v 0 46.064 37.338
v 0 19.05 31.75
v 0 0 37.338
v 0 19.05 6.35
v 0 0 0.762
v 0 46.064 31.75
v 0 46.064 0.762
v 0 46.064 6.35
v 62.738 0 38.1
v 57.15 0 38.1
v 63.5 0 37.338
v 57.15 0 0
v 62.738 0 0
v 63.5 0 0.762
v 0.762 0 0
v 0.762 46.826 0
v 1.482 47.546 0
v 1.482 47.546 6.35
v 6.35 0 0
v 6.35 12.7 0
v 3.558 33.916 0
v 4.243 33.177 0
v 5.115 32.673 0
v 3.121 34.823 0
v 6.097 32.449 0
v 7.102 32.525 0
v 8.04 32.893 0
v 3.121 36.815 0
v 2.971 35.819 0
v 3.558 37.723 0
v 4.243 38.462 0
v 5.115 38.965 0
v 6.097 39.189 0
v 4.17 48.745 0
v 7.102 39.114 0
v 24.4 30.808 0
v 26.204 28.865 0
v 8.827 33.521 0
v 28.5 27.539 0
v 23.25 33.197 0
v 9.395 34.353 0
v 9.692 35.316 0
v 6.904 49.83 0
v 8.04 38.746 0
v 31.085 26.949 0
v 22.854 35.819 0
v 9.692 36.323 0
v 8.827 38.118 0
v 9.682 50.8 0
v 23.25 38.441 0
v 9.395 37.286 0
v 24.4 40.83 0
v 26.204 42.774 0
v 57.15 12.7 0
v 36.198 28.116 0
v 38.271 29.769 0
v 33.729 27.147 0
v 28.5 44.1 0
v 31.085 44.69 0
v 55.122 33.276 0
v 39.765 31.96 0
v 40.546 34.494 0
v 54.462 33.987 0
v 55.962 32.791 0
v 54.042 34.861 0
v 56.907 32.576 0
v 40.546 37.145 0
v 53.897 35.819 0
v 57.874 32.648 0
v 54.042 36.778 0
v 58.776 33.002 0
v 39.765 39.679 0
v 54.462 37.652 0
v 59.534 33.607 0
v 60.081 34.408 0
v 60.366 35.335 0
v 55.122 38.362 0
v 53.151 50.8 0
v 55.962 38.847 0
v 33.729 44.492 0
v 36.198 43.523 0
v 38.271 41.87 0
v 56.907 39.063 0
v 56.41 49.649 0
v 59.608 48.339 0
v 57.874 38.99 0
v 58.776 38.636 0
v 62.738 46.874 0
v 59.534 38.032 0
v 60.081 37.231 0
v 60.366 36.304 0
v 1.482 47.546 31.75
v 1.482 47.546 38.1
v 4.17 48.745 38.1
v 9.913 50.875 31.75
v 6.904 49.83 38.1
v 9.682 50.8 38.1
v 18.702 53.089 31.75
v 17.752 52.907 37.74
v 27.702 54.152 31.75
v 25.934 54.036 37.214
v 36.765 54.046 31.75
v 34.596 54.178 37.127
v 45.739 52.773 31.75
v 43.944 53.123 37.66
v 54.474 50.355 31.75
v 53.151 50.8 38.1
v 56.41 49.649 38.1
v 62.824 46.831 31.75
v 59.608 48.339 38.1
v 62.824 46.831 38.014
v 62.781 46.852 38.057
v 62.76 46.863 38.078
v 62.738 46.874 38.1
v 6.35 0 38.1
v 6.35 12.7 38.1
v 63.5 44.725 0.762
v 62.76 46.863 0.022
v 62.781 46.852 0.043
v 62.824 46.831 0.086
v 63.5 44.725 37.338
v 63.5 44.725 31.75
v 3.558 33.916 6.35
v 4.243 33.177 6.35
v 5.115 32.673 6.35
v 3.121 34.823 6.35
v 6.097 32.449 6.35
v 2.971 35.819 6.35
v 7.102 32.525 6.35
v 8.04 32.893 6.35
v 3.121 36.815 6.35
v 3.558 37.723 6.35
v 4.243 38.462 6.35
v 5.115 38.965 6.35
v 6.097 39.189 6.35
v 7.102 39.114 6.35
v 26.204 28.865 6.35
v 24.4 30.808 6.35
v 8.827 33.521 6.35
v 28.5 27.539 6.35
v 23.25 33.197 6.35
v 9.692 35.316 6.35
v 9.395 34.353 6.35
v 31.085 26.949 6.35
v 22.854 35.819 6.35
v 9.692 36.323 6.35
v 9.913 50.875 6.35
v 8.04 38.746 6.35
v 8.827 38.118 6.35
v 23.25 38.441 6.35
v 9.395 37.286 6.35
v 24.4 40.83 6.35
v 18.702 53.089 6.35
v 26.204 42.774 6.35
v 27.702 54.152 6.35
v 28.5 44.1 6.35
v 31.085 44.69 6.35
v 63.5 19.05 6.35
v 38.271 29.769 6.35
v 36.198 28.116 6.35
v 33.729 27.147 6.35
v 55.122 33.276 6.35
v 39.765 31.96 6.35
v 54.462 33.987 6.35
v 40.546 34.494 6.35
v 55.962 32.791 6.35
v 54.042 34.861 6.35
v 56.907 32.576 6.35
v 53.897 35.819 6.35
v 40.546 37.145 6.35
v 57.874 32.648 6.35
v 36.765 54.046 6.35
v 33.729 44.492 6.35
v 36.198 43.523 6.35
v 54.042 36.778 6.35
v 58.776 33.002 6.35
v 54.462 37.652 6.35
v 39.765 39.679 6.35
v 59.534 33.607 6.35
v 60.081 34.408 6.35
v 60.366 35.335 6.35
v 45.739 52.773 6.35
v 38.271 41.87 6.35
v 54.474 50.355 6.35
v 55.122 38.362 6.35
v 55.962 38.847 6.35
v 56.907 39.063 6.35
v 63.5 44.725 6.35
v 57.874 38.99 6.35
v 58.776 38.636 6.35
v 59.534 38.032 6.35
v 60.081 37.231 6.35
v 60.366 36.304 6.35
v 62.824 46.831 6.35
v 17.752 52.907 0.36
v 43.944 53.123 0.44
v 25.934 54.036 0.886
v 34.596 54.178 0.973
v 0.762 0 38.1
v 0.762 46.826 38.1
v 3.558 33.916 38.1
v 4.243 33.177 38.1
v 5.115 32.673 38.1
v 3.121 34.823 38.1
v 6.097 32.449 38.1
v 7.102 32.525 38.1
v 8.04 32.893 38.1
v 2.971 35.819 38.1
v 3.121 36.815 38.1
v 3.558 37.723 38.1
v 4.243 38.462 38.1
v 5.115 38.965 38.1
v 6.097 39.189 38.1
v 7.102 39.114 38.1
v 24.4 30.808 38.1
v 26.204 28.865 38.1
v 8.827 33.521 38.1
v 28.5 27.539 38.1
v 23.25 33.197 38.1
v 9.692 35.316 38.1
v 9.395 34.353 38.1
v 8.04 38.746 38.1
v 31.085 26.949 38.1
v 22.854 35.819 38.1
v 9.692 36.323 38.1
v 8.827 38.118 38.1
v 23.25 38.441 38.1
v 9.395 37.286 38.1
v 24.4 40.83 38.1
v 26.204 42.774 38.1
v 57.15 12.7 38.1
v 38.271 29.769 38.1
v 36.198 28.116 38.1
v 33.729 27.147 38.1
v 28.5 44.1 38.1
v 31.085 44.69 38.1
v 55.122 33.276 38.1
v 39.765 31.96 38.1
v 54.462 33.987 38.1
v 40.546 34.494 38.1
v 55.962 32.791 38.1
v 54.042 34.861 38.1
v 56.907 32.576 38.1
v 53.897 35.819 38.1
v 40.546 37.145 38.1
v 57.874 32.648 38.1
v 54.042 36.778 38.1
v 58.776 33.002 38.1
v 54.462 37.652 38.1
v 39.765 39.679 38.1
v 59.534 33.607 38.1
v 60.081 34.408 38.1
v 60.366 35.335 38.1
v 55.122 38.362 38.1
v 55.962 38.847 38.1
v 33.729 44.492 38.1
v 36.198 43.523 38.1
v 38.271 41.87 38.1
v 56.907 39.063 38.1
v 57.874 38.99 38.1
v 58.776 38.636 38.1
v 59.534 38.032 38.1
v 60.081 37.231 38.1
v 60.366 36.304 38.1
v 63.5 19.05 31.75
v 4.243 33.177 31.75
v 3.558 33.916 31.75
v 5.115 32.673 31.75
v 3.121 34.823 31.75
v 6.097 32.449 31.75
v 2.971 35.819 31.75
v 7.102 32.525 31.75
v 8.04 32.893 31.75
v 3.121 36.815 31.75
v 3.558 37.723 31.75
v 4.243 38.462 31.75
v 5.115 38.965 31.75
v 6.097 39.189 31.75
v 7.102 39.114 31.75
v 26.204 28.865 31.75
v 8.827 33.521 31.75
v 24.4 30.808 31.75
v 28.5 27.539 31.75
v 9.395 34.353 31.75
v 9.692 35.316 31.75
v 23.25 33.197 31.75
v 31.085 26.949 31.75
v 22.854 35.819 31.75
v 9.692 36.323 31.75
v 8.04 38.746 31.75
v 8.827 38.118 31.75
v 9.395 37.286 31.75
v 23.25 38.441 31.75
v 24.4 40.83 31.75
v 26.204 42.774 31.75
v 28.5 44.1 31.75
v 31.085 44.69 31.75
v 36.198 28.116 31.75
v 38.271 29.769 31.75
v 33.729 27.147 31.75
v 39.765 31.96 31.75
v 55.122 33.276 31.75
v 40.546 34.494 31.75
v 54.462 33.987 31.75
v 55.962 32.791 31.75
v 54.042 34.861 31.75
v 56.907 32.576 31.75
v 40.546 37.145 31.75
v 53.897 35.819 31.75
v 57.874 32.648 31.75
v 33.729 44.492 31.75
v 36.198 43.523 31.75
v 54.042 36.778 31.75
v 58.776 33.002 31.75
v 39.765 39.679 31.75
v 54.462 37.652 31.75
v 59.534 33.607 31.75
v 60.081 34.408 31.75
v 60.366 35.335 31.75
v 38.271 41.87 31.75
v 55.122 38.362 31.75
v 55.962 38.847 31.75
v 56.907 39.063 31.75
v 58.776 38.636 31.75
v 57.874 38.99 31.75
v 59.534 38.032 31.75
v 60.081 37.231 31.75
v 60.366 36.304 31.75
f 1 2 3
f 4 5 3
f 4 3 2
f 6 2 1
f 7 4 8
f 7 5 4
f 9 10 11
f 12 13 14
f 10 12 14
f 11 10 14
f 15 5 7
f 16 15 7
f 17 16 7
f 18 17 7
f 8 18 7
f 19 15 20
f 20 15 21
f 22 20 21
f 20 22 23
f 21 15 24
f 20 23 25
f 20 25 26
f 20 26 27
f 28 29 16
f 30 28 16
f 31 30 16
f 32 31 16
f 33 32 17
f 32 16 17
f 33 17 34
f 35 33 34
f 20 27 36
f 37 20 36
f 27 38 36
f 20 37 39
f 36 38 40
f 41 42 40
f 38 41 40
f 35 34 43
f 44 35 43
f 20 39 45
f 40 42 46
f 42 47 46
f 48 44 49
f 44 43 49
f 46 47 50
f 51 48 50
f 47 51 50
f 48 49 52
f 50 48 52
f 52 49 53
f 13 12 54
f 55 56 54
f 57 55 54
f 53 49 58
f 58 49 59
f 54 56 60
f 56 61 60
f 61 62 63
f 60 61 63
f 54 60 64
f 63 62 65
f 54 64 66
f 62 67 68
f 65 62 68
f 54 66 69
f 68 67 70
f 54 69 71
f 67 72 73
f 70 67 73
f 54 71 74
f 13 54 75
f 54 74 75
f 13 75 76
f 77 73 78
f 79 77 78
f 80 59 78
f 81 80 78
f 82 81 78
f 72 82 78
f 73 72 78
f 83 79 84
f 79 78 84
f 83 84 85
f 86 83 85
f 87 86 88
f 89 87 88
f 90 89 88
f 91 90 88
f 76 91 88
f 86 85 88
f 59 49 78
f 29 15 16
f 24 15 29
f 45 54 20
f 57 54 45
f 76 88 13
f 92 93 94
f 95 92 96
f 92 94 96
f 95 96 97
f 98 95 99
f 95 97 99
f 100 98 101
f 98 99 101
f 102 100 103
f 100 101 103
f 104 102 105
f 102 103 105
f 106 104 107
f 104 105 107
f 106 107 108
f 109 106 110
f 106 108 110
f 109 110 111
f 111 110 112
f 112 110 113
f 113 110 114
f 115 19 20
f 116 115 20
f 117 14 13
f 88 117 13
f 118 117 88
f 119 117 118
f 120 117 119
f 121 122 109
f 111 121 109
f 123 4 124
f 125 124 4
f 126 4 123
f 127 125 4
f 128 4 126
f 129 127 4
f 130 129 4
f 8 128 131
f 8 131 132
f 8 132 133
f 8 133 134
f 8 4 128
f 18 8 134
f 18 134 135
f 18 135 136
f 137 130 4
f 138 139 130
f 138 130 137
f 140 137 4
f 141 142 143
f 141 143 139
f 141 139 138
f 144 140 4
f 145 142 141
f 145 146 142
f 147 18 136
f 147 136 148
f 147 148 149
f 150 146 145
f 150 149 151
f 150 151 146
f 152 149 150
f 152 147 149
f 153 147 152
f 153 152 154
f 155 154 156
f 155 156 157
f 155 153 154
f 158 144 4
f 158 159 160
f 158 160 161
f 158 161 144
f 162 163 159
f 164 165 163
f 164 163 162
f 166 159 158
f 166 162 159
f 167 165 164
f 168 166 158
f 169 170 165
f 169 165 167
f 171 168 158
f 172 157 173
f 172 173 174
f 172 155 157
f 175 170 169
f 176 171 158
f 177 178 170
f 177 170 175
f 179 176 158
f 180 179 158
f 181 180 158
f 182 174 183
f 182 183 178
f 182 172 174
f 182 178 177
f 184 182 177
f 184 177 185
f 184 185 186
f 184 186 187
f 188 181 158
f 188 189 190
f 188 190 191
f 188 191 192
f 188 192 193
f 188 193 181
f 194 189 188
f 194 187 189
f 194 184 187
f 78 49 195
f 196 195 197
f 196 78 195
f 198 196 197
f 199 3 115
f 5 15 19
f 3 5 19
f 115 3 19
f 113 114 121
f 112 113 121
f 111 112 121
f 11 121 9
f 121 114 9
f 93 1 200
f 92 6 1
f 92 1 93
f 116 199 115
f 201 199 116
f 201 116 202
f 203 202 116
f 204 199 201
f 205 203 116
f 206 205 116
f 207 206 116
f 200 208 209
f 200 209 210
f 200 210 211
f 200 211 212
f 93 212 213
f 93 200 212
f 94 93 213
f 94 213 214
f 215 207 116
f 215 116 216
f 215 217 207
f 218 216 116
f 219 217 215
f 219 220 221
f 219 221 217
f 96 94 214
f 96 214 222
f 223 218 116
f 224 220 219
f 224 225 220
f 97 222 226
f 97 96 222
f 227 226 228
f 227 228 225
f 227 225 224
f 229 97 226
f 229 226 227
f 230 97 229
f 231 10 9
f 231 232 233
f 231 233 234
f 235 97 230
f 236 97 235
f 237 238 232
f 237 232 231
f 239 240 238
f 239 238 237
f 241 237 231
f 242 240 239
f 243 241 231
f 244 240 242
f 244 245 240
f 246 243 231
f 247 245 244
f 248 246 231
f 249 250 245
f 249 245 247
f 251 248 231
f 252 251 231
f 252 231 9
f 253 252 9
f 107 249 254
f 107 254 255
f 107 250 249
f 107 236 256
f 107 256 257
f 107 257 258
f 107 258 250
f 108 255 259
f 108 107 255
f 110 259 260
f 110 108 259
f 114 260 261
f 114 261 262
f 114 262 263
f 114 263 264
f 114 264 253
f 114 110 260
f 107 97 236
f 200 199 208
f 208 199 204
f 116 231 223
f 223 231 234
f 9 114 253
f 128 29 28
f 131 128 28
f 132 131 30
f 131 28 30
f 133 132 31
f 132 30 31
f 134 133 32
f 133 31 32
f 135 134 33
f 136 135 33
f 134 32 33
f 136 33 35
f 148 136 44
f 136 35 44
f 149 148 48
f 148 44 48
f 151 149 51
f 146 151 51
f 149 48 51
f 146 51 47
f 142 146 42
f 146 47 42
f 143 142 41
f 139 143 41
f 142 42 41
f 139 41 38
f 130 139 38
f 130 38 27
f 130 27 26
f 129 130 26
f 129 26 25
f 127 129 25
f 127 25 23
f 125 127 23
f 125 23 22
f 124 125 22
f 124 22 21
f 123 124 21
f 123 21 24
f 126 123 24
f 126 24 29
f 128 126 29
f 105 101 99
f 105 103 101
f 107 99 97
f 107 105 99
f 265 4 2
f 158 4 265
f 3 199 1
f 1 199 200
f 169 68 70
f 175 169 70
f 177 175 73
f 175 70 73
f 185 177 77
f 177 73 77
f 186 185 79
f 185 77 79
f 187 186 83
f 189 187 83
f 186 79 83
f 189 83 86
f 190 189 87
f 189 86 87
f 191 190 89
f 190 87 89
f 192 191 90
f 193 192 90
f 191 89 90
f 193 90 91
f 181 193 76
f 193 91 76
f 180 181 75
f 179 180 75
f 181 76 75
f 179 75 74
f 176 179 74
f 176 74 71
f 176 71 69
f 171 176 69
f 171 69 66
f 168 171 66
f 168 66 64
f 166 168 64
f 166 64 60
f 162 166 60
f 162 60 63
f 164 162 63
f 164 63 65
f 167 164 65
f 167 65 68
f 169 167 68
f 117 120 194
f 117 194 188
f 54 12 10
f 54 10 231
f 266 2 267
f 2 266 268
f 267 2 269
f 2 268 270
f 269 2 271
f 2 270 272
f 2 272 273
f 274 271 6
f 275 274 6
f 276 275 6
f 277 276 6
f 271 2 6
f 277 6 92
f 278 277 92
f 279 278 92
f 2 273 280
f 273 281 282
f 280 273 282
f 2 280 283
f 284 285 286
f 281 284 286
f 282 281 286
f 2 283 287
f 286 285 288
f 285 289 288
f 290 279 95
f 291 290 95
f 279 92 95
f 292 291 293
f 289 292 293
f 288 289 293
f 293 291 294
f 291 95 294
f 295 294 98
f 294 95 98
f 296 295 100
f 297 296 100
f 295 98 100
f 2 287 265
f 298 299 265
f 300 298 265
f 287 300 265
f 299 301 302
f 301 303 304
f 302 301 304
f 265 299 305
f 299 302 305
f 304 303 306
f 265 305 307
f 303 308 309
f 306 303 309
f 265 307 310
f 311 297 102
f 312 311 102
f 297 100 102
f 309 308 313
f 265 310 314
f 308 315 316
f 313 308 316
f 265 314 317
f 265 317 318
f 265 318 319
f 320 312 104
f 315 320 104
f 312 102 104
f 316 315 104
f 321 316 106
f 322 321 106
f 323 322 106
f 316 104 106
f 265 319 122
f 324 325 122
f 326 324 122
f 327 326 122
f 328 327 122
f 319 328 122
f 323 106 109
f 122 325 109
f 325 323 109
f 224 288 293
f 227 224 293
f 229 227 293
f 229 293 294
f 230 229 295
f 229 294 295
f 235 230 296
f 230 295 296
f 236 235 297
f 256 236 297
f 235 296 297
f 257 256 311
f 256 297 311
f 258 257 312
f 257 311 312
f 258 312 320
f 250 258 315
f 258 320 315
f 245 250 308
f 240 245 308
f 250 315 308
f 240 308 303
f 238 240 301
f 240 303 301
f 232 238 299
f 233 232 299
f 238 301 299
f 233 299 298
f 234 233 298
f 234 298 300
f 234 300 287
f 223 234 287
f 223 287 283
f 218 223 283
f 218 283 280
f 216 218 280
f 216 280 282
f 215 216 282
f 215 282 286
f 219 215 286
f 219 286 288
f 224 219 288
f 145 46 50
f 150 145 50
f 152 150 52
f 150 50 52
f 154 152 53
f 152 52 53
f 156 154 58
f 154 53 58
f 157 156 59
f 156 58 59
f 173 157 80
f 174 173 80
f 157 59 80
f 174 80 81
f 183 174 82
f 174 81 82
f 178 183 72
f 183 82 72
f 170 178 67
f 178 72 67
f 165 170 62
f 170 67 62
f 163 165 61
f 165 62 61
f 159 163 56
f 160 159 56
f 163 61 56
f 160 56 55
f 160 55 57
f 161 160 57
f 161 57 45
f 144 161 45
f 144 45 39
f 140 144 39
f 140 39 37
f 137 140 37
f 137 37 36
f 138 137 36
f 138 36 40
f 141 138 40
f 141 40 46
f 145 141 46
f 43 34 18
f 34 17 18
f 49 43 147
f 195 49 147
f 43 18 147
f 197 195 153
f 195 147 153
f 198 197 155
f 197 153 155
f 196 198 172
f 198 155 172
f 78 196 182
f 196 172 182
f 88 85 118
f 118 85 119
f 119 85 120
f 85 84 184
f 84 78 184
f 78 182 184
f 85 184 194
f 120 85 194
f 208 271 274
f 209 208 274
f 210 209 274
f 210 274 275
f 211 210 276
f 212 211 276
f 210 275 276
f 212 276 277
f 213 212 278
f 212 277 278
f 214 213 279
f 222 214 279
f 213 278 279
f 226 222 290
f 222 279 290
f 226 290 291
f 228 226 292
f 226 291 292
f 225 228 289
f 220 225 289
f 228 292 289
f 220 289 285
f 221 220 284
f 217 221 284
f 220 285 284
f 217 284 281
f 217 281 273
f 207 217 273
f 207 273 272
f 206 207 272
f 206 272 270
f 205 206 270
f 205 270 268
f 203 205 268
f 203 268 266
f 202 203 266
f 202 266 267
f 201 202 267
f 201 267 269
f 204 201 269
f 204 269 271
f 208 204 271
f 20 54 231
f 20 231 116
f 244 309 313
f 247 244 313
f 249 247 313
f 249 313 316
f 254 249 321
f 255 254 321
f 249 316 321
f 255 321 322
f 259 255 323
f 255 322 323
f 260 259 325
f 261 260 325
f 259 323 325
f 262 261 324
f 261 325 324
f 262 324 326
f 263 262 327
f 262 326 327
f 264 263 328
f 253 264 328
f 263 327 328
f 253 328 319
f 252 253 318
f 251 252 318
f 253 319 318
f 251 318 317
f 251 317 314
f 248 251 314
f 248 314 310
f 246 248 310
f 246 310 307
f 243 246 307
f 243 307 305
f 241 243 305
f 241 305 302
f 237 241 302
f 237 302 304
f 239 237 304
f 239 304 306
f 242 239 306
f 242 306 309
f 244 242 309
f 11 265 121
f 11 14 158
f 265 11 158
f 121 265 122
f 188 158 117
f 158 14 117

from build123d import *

# Parameters (mm, degrees)
SKETCH1_W               = 63.5
SKETCH1_H               = 57.15
BOSS_EXTRUDE1_DEPTH     = 38.1
SKETCH2_W               = 50.8
SKETCH2_H               = 12.7
CUT_EXTRUDE1_DEPTH      = 94.541341128
SKETCH3_W               = 63.5
SKETCH3_H               = 25.4
CUT_EXTRUDE2_DEPTH      = 38.1
FILLET3_R               = 6.35
FILLET4_R               = 6.35
SKETCH4_R               = 3.252730628
SKETCH4_R_2             = 3.379495502
SKETCH4_R_3             = 8.895504244
CUT_EXTRUDE3_DEPTH      = 94.541341128
CHAMFER1_SIZE           = 0.762
CHAMFER2_SIZE           = 0.762
CUT_EXTRUDE5_DEPTH      = 92.139645599
CUT_EXTRUDE5_DEPTH_BACK = 92.139645599
CHAMFER3_SIZE           = 0.762
CHAMFER3_SIZE_2         = 1.762810924


# Some blends are built 0.0001 mm under size
with BuildPart() as part:
    # Sketch1 → Boss-Extrude1 (new body)
    with BuildSketch(Plane.XY):
        with Locations((31.75, 28.575)):
            Rectangle(SKETCH1_W, SKETCH1_H)
    extrude(amount=BOSS_EXTRUDE1_DEPTH)

    # Sketch2 → Cut-Extrude1 (cut, through all)
    with BuildSketch(Plane(origin=(0, 0, 0), x_dir=(-1, 0, 0), z_dir=(0, 0, -1))):
        with Locations((-31.75, 6.35)):
            Rectangle(SKETCH2_W, SKETCH2_H)
    extrude(amount=-CUT_EXTRUDE1_DEPTH, mode=Mode.SUBTRACT)

    # Sketch3 → Cut-Extrude2 (cut)
    with BuildSketch(Plane(origin=(0, 57.15, 0), x_dir=(1, 0, 0), z_dir=(0, 1, 0))):
        with Locations((31.75, -19.05)):
            Rectangle(SKETCH3_W, SKETCH3_H)
    extrude(amount=-CUT_EXTRUDE2_DEPTH, mode=Mode.SUBTRACT)

    # Fillet3
    fillet3_edges = [part.edges().sort_by_distance(p)[0] for p in [
        (31.75, 57.15, 38.1),
    ]]
    fillet(fillet3_edges, radius=FILLET3_R - 0.0001)  # a hair under: the kernel refuses the full size

    # Fillet4
    fillet4_edges = [part.edges().sort_by_distance(p)[0] for p in [
        (31.75, 57.15, 0),
    ]]
    fillet(fillet4_edges, radius=FILLET4_R - 0.0001)  # a hair under: the kernel refuses the full size

    # Sketch4 → Cut-Extrude3 (cut, through all)
    with BuildSketch(Plane(origin=(0, 0, 0), x_dir=(-1, 0, 0), z_dir=(0, 0, -1))):
        with Locations((-57.15, 35.819311932)):
            Circle(SKETCH4_R)
        with Locations((-6.35, 35.819311932)):
            Circle(SKETCH4_R_2)
        with Locations((-31.75, 35.819311932)):
            Circle(SKETCH4_R_3)
    extrude(amount=-CUT_EXTRUDE3_DEPTH, mode=Mode.SUBTRACT)

    # Chamfer1
    chamfer1_edges = [part.edges().sort_by_distance(p)[0] for p in [
        (63.5, 55.29015735, 1.85984265),
        (63.5, 25.40005, 0),
    ]]
    chamfer(chamfer1_edges, length=CHAMFER1_SIZE)

    # Chamfer2
    chamfer2_edges = [part.edges().sort_by_distance(p)[0] for p in [
        (0, 25.40005, 38.1),
        (63.5, 55.29015735, 36.24015735),
        (0, 55.29015735, 36.24015735),
        (0, 25.40005, 0),
        (0, 55.29015735, 1.85984265),
        (63.5, 25.40005, 38.1),
    ]]
    chamfer(chamfer2_edges, length=CHAMFER2_SIZE)

    # Sketch5 → Cut-Extrude5 (cut, two sides: drawn at the far end of the back side and taken through both)
    with BuildSketch(Plane(origin=(0, 0, 31.75), x_dir=(-1, 0, 0), z_dir=(0, 0, -1)).offset(-CUT_EXTRUDE5_DEPTH_BACK)):
        with BuildLine():
            Line((152.450199575, -35.171760157), (1.839159199, 45.87092885))
            ThreePointArc((1.839159199, 45.87092885), (-32.809317684, 54.236506182), (-67.098653648, 44.502993274))
            Line((-67.098653648, 44.502993274), (-214.376135409, -42.450708722))
            Line((-214.376135409, -42.450708722), (-221.162348462, 299.543968154))
            Line((-221.162348462, 299.543968154), (145.663986523, 306.822916719))
            Line((145.663986523, 306.822916719), (152.450199575, -35.171760157))
        make_face()
    extrude(amount=CUT_EXTRUDE5_DEPTH + CUT_EXTRUDE5_DEPTH_BACK, mode=Mode.SUBTRACT)

    # Chamfer3
    # the kernel refuses this chamfer: 1.762810924, 1.706340641, 0.762 mm, written as the material it takes off along each edge
    with BuildSketch(Plane(origin=(0, 46.825825111, -3.52035895), x_dir=(0.8994074011398961, 0.43711134368119303, 0), z_dir=(0, 0, 1))) as chamfer3_piece_1:
        with BuildLine():
            Line((1.648294394, 0), (-CHAMFER3_SIZE * 0.437111343681, -CHAMFER3_SIZE * 0.89940740114))
            Line((-CHAMFER3_SIZE * 0.437111343681, -CHAMFER3_SIZE * 0.89940740114), (0, 0))
            ThreePointArc((0, 0), (0.856396227, 0.004831664), (1.648294394, 0))
        make_face()
    extrude(amount=14.152717899, mode=Mode.SUBTRACT)
    with BuildSketch(Plane(origin=(0, 46.825825111, 27.46764105), x_dir=(0, -1, 0), z_dir=(0, 0, 1))) as chamfer3_piece_2:
        with BuildLine():
            Line((CHAMFER3_SIZE, 0), (-0.720488177, 1.482488177))
            ThreePointArc((-0.720488177, 1.482488177), (-0.37868614, 0.76813713), (0, 0))
            Line((0, 0), (CHAMFER3_SIZE, 0))
        make_face()
    extrude(amount=14.152717899, mode=Mode.SUBTRACT)
    with BuildSketch(Plane(origin=(63.5, 46.487927277, -3.813189181), x_dir=(-0.8918533135709217, 0.4523247363040928, 0), z_dir=(0, 0, 1))) as chamfer3_piece_3:
        with BuildLine():
            Line((0.757918605, 0), (-CHAMFER3_SIZE_2 * 0.452324736297, CHAMFER3_SIZE_2 * 0.891853313556))
            Line((-CHAMFER3_SIZE_2 * 0.452324736297, CHAMFER3_SIZE_2 * 0.891853313556), (0, 0))
            ThreePointArc((0, 0), (0.403745747, -0.001018742), (0.757918605, 0))
        make_face()
    extrude(amount=14.738378362, mode=Mode.SUBTRACT)
    with BuildSketch(Plane(origin=(63.5, 46.487927277, 27.174810819), x_dir=(0, -1, 0), z_dir=(0, 0, 1))) as chamfer3_piece_4:
        with BuildLine():
            Line((CHAMFER3_SIZE_2, 0), (-0.342825333, -0.675952219))
            ThreePointArc((-0.342825333, -0.675952219), (-0.183532757, -0.35962118), (0, 0))
            Line((0, 0), (CHAMFER3_SIZE_2, 0))
        make_face()
    extrude(amount=14.738378362, mode=Mode.SUBTRACT)


solid = part.part
